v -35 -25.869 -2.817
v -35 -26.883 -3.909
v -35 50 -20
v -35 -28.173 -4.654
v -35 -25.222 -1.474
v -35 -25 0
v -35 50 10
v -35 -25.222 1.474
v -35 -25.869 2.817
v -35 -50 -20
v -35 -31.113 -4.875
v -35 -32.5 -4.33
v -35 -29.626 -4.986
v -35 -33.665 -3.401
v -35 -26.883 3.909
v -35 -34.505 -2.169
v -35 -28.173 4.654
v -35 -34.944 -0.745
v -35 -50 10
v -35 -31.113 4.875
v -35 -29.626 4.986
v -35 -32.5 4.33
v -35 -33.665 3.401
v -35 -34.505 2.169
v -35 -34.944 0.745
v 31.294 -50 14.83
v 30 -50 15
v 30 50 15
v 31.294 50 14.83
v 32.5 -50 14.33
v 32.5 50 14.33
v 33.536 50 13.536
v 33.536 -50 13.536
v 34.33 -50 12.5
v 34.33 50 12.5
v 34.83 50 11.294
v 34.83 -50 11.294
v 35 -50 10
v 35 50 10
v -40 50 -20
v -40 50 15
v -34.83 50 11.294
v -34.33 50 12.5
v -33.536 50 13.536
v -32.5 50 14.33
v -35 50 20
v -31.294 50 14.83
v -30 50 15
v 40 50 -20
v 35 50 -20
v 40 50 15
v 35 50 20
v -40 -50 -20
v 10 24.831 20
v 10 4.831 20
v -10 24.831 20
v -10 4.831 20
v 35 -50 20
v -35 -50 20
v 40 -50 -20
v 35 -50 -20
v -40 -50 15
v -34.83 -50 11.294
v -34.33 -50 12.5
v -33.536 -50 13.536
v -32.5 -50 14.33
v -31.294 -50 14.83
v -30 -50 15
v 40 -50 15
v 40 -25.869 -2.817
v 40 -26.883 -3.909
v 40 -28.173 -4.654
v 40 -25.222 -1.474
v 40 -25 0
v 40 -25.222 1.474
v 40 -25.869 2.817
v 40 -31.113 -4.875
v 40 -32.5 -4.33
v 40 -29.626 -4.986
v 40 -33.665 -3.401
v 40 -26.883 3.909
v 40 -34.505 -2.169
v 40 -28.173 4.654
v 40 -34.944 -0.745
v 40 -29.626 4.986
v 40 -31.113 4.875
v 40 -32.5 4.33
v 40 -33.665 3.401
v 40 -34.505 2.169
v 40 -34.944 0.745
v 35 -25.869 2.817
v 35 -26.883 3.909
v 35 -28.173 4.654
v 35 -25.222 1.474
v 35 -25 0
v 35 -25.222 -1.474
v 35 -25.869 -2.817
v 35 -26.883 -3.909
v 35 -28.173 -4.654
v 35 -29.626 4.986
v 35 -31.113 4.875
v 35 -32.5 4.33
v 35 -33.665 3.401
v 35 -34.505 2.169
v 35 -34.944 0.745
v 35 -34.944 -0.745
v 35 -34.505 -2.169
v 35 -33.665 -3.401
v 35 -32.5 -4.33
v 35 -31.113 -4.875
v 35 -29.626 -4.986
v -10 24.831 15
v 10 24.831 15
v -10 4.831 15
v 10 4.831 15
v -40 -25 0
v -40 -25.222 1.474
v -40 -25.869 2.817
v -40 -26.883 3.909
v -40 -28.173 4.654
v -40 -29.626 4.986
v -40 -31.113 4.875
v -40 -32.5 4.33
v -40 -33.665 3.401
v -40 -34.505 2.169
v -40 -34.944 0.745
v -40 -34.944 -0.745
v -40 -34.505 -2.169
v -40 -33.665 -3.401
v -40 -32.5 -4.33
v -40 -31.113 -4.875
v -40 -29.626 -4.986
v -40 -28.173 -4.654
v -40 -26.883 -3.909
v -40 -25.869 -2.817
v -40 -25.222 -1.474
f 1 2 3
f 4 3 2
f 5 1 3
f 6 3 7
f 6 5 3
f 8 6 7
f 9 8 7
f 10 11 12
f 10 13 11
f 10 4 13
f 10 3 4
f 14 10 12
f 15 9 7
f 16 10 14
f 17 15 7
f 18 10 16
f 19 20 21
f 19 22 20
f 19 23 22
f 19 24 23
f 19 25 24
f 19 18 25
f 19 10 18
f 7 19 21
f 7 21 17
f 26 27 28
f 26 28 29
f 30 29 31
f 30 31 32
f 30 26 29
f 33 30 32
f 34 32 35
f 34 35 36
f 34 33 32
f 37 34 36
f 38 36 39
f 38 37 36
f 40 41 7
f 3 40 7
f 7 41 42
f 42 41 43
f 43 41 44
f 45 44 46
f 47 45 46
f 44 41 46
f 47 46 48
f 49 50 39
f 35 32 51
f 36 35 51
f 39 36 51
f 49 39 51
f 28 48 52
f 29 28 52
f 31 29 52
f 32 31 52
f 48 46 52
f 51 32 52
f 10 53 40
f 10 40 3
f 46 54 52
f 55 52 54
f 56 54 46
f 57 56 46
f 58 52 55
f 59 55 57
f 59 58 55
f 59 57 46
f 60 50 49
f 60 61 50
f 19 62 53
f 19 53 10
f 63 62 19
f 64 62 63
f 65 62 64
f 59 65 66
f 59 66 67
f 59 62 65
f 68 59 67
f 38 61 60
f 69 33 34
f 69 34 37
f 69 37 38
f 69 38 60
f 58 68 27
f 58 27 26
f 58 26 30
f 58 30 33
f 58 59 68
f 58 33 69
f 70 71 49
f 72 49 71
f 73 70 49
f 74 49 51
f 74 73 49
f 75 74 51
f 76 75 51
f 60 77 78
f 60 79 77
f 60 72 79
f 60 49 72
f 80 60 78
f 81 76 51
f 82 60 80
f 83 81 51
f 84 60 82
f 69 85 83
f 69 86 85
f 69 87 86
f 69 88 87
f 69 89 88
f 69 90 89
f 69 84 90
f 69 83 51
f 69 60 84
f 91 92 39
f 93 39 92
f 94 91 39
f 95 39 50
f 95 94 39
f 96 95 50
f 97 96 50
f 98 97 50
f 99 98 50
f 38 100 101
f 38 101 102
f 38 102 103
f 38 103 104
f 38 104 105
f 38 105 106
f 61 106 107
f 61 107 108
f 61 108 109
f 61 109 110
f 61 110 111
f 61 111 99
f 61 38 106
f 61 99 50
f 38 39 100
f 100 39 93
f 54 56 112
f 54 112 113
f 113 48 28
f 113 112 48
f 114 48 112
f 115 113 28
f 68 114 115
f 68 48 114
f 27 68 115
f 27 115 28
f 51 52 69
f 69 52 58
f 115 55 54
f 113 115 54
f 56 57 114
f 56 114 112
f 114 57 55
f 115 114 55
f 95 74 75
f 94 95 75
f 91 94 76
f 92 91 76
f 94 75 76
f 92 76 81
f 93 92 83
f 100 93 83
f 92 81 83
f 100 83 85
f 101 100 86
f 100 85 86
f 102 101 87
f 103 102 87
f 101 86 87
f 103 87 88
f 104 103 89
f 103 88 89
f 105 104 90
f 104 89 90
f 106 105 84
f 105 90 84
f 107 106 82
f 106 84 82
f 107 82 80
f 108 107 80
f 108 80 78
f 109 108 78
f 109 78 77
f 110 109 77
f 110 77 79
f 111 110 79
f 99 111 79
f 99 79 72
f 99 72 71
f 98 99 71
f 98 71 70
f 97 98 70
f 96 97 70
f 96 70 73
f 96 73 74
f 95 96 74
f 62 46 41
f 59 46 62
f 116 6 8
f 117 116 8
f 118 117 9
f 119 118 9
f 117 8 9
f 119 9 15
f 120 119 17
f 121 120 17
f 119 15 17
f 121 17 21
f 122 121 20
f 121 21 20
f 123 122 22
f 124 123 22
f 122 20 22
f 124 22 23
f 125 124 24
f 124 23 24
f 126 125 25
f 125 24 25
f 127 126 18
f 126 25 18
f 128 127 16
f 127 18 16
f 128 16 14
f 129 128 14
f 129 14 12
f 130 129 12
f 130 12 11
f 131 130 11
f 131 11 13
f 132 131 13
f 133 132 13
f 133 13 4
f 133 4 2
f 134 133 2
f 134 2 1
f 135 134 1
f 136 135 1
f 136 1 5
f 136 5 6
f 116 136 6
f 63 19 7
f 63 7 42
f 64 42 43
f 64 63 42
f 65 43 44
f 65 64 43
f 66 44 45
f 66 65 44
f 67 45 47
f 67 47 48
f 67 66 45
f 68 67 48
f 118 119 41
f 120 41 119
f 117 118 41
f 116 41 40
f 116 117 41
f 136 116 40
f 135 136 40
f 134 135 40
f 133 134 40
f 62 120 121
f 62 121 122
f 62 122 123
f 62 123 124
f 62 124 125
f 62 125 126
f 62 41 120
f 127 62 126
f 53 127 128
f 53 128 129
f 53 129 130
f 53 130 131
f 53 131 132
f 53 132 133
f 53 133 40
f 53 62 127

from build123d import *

# Parameters (mm, degrees)
F1_DEPTH = 50
F2_SIZE  = 5
F3_W     = 20
F3_H     = 20
F4_DEPTH = 10
F5_R     = 5
F6_DEPTH = 100


with BuildPart() as f1:
    # F0 (on Front) → F1 (new body, symmetric)
    with BuildSketch(Plane.XZ):
        with BuildLine():
            Line((40, -20), (40, 20))
            Line((40, 20), (-40, 20))
            Line((-40, 20), (-40, -20))
            Line((-40, -20), (-35, -20))
            Line((-35, -20), (-35, 10))
            ThreePointArc((-35, 10), (-33.535534, 13.535534), (-30, 15))
            Line((-30, 15), (30, 15))
            ThreePointArc((30, 15), (33.535534, 13.535534), (35, 10))
            Line((35, 10), (35, -20))
            Line((35, -20), (40, -20))
        make_face()
    extrude(amount=F1_DEPTH, both=True)

    # F2
    f2_edges = [f1.edges().sort_by_distance(p)[0] for p in [
        (40, 0, 20),
        (-40, 0, 20),
    ]]
    chamfer(f2_edges, length=F2_SIZE)

    # F3 (on face) → F4 (cut)
    with BuildSketch(Plane.XY.offset(20)):
        with Locations((0, 14.830591)):
            Rectangle(F3_W, F3_H)
    extrude(amount=-F4_DEPTH, mode=Mode.SUBTRACT)

    # F5 (on face) → F6 (cut)
    with BuildSketch(Plane.YZ.offset(40)):
        with Locations((-30, 0)):
            Circle(F5_R)
    extrude(amount=-F6_DEPTH, mode=Mode.SUBTRACT)


solid = f1.part
